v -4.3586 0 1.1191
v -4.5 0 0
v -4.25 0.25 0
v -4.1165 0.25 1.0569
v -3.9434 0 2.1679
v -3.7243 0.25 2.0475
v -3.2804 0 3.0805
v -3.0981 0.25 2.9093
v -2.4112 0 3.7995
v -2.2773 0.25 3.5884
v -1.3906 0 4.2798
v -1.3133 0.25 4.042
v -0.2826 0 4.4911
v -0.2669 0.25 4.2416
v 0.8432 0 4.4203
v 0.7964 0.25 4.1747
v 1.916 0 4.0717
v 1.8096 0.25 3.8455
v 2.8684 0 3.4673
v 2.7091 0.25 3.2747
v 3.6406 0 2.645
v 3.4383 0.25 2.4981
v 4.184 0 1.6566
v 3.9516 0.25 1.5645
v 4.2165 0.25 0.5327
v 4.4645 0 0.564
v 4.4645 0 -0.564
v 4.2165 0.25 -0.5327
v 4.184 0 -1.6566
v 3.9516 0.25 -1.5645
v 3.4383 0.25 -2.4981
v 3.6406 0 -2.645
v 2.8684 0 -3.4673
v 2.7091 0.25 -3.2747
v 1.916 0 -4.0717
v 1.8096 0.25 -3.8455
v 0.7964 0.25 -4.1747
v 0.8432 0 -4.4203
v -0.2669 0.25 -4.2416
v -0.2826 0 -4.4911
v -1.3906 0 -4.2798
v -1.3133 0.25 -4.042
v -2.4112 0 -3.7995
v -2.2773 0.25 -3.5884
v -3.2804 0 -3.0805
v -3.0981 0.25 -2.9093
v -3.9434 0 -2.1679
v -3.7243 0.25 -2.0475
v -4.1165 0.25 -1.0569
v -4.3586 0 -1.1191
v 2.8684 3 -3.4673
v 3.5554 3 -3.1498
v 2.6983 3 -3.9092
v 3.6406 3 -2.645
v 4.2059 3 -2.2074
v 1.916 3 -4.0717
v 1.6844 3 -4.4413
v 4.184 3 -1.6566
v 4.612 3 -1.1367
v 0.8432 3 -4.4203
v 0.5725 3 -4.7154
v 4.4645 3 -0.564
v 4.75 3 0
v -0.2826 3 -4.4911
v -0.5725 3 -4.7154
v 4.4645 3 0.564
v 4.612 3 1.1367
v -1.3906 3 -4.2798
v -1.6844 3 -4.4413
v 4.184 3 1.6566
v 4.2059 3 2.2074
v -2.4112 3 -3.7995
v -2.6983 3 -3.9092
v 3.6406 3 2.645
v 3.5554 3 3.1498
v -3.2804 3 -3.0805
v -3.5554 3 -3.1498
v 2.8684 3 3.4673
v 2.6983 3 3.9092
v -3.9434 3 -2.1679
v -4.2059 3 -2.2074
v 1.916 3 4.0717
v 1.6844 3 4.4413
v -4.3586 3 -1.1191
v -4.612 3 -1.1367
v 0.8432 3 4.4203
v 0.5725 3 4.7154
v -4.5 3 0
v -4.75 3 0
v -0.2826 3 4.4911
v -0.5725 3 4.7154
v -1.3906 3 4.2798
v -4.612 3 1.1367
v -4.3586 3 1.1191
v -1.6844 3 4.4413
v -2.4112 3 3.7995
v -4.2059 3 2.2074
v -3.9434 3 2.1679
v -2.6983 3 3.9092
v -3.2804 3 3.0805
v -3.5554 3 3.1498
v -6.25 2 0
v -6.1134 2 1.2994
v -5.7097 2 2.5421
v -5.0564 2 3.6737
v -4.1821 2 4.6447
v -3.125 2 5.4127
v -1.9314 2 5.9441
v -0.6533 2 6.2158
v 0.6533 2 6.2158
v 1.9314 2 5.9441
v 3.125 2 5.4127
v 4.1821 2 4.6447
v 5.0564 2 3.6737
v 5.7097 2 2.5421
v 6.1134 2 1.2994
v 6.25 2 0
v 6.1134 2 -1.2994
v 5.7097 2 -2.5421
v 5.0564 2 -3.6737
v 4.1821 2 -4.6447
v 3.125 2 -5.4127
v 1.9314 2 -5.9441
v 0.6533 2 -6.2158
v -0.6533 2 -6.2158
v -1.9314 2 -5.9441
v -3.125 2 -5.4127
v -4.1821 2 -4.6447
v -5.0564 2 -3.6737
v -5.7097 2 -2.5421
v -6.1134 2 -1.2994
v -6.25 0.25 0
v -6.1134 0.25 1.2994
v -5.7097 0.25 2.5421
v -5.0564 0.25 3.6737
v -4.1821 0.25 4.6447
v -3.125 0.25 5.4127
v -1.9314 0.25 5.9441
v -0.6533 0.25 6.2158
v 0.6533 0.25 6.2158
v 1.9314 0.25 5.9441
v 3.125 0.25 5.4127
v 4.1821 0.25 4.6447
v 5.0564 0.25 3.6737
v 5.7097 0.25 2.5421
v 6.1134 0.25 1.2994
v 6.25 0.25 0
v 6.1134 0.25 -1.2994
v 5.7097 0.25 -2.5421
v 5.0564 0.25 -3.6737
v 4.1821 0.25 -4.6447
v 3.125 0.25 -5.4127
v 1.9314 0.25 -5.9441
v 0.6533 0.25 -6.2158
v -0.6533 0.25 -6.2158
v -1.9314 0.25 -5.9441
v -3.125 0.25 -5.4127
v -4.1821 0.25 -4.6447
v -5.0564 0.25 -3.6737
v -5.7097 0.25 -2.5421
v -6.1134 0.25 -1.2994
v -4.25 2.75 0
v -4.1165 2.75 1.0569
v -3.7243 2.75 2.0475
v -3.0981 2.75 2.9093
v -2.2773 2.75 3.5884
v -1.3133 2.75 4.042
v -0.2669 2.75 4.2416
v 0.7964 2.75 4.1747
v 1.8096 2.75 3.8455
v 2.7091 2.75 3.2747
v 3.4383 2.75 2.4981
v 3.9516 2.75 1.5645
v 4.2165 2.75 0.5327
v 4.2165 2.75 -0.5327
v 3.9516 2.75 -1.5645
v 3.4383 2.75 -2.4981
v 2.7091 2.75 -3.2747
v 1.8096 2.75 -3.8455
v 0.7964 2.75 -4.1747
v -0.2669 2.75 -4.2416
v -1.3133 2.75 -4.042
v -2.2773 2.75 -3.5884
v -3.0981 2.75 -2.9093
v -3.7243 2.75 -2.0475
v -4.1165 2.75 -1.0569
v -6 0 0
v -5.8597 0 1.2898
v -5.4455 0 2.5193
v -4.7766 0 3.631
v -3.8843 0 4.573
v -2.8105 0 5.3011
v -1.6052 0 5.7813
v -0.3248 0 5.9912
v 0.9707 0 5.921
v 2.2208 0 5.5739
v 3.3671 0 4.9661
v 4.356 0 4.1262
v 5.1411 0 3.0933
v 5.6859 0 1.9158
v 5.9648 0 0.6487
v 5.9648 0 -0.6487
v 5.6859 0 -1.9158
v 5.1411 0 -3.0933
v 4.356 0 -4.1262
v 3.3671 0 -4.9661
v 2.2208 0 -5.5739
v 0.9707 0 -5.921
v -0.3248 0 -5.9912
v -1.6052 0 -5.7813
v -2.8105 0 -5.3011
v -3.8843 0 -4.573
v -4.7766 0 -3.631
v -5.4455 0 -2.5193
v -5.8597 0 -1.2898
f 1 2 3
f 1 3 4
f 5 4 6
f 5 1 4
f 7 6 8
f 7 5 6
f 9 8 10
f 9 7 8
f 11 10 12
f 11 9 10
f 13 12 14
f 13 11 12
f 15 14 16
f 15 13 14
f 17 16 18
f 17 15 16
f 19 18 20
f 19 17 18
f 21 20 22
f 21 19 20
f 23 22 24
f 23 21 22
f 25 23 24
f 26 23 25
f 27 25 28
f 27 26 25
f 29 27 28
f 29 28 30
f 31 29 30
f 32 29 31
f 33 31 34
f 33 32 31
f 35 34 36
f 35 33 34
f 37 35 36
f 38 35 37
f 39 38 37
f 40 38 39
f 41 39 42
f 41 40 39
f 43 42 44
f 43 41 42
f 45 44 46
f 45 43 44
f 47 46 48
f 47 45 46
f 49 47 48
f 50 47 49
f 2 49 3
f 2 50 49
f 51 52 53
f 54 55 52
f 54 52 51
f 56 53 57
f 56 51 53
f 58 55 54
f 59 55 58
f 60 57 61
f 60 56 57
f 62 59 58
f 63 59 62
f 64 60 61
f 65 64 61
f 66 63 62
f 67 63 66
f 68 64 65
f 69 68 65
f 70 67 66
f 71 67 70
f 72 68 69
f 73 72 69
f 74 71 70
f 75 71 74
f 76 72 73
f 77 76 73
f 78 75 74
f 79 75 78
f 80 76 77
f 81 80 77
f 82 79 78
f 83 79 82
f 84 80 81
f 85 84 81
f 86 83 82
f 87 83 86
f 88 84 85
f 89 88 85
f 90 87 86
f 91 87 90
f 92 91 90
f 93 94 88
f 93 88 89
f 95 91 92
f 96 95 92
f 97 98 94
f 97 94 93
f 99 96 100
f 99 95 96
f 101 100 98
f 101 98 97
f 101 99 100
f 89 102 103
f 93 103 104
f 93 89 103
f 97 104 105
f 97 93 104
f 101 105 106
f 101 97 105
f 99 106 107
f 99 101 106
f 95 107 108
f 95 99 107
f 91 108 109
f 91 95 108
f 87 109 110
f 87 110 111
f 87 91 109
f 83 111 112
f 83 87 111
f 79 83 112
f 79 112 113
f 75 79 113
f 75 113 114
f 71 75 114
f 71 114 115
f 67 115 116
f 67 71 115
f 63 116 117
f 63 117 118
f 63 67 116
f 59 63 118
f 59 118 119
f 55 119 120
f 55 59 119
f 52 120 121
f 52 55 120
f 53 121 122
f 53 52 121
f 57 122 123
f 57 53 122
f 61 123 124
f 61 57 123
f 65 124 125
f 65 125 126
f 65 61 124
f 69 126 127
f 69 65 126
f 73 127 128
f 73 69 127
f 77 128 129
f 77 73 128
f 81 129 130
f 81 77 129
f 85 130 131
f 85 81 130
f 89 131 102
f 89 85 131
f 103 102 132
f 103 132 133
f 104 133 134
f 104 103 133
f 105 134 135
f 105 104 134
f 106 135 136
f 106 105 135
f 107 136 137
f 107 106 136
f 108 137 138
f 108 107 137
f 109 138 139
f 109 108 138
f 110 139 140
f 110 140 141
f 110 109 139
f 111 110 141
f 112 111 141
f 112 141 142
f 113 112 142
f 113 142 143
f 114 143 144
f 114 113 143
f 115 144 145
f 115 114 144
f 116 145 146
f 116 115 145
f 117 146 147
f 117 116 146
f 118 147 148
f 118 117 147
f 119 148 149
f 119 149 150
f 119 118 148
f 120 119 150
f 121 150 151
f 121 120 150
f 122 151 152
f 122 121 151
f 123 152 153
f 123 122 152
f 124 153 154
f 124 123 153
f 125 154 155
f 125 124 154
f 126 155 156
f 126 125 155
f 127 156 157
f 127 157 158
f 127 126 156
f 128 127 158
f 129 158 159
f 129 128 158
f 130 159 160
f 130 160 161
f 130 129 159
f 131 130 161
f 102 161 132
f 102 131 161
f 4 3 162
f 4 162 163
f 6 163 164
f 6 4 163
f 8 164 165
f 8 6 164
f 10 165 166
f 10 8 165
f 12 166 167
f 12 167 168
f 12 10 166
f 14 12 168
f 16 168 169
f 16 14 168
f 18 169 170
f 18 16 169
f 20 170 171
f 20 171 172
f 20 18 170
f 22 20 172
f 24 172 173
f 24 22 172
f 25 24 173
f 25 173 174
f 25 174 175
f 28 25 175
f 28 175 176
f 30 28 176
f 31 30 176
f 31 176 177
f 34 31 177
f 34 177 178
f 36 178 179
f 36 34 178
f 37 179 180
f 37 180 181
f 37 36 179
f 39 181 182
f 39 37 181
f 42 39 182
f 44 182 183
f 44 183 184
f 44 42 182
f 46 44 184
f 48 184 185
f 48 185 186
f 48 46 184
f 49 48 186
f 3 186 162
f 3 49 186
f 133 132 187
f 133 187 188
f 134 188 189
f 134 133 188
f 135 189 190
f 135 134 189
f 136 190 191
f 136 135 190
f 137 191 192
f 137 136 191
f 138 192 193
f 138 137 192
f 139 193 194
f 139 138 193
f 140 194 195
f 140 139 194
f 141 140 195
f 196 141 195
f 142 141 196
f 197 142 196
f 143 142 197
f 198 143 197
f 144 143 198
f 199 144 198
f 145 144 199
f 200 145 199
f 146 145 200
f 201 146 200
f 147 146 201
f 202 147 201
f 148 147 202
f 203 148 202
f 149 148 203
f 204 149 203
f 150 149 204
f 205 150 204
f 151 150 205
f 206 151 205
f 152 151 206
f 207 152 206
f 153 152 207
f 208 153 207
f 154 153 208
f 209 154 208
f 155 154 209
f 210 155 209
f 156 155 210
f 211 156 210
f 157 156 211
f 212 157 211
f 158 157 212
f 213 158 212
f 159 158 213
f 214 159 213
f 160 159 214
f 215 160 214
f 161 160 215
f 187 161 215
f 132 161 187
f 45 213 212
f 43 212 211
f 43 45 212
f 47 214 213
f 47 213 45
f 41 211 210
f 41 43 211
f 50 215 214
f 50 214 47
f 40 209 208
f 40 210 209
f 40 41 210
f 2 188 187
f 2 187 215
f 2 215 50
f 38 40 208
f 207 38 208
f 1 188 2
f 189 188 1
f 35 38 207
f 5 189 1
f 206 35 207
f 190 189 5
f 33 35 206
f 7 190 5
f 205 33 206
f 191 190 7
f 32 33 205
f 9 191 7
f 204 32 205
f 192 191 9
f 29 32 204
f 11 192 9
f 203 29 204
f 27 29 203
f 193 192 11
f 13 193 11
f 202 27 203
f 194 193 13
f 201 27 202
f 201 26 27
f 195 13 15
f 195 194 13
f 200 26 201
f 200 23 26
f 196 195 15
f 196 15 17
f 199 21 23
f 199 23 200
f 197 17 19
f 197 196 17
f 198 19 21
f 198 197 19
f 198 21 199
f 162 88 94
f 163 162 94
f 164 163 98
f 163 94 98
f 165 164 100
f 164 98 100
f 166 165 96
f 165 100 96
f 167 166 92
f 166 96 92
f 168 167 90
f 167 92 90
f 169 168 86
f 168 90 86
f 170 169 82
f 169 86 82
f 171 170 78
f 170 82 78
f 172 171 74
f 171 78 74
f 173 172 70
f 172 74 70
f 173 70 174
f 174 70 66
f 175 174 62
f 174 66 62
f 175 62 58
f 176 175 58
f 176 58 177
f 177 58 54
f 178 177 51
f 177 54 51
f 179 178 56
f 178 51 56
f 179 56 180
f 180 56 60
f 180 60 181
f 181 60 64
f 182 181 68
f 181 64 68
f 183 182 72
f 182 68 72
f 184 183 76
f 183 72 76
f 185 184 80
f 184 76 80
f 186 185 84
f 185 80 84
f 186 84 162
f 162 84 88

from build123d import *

# Parameters (mm, degrees)
CHAMFER1_SIZE = 0.25


with BuildPart() as part:
    # Sketch1 → Revolve1 (revolve)
    with BuildSketch(Plane.XY):
        Polygon((-4.25, 3), (-4.25, 0), (-6.25, 0), (-6.25, 2), (-4.75, 3), align=None)
    revolve(axis=Axis((0, 0, 0), (0, 1, 0)))

    # Chamfer1
    chamfer1_edges = [part.edges().sort_by_distance(p)[0] for p in [
        (6.25, 0, 0),
        (4.25, 0, 0),
        (4.25, 3, 0),
    ]]
    chamfer(chamfer1_edges, length=CHAMFER1_SIZE)


solid = part.part
